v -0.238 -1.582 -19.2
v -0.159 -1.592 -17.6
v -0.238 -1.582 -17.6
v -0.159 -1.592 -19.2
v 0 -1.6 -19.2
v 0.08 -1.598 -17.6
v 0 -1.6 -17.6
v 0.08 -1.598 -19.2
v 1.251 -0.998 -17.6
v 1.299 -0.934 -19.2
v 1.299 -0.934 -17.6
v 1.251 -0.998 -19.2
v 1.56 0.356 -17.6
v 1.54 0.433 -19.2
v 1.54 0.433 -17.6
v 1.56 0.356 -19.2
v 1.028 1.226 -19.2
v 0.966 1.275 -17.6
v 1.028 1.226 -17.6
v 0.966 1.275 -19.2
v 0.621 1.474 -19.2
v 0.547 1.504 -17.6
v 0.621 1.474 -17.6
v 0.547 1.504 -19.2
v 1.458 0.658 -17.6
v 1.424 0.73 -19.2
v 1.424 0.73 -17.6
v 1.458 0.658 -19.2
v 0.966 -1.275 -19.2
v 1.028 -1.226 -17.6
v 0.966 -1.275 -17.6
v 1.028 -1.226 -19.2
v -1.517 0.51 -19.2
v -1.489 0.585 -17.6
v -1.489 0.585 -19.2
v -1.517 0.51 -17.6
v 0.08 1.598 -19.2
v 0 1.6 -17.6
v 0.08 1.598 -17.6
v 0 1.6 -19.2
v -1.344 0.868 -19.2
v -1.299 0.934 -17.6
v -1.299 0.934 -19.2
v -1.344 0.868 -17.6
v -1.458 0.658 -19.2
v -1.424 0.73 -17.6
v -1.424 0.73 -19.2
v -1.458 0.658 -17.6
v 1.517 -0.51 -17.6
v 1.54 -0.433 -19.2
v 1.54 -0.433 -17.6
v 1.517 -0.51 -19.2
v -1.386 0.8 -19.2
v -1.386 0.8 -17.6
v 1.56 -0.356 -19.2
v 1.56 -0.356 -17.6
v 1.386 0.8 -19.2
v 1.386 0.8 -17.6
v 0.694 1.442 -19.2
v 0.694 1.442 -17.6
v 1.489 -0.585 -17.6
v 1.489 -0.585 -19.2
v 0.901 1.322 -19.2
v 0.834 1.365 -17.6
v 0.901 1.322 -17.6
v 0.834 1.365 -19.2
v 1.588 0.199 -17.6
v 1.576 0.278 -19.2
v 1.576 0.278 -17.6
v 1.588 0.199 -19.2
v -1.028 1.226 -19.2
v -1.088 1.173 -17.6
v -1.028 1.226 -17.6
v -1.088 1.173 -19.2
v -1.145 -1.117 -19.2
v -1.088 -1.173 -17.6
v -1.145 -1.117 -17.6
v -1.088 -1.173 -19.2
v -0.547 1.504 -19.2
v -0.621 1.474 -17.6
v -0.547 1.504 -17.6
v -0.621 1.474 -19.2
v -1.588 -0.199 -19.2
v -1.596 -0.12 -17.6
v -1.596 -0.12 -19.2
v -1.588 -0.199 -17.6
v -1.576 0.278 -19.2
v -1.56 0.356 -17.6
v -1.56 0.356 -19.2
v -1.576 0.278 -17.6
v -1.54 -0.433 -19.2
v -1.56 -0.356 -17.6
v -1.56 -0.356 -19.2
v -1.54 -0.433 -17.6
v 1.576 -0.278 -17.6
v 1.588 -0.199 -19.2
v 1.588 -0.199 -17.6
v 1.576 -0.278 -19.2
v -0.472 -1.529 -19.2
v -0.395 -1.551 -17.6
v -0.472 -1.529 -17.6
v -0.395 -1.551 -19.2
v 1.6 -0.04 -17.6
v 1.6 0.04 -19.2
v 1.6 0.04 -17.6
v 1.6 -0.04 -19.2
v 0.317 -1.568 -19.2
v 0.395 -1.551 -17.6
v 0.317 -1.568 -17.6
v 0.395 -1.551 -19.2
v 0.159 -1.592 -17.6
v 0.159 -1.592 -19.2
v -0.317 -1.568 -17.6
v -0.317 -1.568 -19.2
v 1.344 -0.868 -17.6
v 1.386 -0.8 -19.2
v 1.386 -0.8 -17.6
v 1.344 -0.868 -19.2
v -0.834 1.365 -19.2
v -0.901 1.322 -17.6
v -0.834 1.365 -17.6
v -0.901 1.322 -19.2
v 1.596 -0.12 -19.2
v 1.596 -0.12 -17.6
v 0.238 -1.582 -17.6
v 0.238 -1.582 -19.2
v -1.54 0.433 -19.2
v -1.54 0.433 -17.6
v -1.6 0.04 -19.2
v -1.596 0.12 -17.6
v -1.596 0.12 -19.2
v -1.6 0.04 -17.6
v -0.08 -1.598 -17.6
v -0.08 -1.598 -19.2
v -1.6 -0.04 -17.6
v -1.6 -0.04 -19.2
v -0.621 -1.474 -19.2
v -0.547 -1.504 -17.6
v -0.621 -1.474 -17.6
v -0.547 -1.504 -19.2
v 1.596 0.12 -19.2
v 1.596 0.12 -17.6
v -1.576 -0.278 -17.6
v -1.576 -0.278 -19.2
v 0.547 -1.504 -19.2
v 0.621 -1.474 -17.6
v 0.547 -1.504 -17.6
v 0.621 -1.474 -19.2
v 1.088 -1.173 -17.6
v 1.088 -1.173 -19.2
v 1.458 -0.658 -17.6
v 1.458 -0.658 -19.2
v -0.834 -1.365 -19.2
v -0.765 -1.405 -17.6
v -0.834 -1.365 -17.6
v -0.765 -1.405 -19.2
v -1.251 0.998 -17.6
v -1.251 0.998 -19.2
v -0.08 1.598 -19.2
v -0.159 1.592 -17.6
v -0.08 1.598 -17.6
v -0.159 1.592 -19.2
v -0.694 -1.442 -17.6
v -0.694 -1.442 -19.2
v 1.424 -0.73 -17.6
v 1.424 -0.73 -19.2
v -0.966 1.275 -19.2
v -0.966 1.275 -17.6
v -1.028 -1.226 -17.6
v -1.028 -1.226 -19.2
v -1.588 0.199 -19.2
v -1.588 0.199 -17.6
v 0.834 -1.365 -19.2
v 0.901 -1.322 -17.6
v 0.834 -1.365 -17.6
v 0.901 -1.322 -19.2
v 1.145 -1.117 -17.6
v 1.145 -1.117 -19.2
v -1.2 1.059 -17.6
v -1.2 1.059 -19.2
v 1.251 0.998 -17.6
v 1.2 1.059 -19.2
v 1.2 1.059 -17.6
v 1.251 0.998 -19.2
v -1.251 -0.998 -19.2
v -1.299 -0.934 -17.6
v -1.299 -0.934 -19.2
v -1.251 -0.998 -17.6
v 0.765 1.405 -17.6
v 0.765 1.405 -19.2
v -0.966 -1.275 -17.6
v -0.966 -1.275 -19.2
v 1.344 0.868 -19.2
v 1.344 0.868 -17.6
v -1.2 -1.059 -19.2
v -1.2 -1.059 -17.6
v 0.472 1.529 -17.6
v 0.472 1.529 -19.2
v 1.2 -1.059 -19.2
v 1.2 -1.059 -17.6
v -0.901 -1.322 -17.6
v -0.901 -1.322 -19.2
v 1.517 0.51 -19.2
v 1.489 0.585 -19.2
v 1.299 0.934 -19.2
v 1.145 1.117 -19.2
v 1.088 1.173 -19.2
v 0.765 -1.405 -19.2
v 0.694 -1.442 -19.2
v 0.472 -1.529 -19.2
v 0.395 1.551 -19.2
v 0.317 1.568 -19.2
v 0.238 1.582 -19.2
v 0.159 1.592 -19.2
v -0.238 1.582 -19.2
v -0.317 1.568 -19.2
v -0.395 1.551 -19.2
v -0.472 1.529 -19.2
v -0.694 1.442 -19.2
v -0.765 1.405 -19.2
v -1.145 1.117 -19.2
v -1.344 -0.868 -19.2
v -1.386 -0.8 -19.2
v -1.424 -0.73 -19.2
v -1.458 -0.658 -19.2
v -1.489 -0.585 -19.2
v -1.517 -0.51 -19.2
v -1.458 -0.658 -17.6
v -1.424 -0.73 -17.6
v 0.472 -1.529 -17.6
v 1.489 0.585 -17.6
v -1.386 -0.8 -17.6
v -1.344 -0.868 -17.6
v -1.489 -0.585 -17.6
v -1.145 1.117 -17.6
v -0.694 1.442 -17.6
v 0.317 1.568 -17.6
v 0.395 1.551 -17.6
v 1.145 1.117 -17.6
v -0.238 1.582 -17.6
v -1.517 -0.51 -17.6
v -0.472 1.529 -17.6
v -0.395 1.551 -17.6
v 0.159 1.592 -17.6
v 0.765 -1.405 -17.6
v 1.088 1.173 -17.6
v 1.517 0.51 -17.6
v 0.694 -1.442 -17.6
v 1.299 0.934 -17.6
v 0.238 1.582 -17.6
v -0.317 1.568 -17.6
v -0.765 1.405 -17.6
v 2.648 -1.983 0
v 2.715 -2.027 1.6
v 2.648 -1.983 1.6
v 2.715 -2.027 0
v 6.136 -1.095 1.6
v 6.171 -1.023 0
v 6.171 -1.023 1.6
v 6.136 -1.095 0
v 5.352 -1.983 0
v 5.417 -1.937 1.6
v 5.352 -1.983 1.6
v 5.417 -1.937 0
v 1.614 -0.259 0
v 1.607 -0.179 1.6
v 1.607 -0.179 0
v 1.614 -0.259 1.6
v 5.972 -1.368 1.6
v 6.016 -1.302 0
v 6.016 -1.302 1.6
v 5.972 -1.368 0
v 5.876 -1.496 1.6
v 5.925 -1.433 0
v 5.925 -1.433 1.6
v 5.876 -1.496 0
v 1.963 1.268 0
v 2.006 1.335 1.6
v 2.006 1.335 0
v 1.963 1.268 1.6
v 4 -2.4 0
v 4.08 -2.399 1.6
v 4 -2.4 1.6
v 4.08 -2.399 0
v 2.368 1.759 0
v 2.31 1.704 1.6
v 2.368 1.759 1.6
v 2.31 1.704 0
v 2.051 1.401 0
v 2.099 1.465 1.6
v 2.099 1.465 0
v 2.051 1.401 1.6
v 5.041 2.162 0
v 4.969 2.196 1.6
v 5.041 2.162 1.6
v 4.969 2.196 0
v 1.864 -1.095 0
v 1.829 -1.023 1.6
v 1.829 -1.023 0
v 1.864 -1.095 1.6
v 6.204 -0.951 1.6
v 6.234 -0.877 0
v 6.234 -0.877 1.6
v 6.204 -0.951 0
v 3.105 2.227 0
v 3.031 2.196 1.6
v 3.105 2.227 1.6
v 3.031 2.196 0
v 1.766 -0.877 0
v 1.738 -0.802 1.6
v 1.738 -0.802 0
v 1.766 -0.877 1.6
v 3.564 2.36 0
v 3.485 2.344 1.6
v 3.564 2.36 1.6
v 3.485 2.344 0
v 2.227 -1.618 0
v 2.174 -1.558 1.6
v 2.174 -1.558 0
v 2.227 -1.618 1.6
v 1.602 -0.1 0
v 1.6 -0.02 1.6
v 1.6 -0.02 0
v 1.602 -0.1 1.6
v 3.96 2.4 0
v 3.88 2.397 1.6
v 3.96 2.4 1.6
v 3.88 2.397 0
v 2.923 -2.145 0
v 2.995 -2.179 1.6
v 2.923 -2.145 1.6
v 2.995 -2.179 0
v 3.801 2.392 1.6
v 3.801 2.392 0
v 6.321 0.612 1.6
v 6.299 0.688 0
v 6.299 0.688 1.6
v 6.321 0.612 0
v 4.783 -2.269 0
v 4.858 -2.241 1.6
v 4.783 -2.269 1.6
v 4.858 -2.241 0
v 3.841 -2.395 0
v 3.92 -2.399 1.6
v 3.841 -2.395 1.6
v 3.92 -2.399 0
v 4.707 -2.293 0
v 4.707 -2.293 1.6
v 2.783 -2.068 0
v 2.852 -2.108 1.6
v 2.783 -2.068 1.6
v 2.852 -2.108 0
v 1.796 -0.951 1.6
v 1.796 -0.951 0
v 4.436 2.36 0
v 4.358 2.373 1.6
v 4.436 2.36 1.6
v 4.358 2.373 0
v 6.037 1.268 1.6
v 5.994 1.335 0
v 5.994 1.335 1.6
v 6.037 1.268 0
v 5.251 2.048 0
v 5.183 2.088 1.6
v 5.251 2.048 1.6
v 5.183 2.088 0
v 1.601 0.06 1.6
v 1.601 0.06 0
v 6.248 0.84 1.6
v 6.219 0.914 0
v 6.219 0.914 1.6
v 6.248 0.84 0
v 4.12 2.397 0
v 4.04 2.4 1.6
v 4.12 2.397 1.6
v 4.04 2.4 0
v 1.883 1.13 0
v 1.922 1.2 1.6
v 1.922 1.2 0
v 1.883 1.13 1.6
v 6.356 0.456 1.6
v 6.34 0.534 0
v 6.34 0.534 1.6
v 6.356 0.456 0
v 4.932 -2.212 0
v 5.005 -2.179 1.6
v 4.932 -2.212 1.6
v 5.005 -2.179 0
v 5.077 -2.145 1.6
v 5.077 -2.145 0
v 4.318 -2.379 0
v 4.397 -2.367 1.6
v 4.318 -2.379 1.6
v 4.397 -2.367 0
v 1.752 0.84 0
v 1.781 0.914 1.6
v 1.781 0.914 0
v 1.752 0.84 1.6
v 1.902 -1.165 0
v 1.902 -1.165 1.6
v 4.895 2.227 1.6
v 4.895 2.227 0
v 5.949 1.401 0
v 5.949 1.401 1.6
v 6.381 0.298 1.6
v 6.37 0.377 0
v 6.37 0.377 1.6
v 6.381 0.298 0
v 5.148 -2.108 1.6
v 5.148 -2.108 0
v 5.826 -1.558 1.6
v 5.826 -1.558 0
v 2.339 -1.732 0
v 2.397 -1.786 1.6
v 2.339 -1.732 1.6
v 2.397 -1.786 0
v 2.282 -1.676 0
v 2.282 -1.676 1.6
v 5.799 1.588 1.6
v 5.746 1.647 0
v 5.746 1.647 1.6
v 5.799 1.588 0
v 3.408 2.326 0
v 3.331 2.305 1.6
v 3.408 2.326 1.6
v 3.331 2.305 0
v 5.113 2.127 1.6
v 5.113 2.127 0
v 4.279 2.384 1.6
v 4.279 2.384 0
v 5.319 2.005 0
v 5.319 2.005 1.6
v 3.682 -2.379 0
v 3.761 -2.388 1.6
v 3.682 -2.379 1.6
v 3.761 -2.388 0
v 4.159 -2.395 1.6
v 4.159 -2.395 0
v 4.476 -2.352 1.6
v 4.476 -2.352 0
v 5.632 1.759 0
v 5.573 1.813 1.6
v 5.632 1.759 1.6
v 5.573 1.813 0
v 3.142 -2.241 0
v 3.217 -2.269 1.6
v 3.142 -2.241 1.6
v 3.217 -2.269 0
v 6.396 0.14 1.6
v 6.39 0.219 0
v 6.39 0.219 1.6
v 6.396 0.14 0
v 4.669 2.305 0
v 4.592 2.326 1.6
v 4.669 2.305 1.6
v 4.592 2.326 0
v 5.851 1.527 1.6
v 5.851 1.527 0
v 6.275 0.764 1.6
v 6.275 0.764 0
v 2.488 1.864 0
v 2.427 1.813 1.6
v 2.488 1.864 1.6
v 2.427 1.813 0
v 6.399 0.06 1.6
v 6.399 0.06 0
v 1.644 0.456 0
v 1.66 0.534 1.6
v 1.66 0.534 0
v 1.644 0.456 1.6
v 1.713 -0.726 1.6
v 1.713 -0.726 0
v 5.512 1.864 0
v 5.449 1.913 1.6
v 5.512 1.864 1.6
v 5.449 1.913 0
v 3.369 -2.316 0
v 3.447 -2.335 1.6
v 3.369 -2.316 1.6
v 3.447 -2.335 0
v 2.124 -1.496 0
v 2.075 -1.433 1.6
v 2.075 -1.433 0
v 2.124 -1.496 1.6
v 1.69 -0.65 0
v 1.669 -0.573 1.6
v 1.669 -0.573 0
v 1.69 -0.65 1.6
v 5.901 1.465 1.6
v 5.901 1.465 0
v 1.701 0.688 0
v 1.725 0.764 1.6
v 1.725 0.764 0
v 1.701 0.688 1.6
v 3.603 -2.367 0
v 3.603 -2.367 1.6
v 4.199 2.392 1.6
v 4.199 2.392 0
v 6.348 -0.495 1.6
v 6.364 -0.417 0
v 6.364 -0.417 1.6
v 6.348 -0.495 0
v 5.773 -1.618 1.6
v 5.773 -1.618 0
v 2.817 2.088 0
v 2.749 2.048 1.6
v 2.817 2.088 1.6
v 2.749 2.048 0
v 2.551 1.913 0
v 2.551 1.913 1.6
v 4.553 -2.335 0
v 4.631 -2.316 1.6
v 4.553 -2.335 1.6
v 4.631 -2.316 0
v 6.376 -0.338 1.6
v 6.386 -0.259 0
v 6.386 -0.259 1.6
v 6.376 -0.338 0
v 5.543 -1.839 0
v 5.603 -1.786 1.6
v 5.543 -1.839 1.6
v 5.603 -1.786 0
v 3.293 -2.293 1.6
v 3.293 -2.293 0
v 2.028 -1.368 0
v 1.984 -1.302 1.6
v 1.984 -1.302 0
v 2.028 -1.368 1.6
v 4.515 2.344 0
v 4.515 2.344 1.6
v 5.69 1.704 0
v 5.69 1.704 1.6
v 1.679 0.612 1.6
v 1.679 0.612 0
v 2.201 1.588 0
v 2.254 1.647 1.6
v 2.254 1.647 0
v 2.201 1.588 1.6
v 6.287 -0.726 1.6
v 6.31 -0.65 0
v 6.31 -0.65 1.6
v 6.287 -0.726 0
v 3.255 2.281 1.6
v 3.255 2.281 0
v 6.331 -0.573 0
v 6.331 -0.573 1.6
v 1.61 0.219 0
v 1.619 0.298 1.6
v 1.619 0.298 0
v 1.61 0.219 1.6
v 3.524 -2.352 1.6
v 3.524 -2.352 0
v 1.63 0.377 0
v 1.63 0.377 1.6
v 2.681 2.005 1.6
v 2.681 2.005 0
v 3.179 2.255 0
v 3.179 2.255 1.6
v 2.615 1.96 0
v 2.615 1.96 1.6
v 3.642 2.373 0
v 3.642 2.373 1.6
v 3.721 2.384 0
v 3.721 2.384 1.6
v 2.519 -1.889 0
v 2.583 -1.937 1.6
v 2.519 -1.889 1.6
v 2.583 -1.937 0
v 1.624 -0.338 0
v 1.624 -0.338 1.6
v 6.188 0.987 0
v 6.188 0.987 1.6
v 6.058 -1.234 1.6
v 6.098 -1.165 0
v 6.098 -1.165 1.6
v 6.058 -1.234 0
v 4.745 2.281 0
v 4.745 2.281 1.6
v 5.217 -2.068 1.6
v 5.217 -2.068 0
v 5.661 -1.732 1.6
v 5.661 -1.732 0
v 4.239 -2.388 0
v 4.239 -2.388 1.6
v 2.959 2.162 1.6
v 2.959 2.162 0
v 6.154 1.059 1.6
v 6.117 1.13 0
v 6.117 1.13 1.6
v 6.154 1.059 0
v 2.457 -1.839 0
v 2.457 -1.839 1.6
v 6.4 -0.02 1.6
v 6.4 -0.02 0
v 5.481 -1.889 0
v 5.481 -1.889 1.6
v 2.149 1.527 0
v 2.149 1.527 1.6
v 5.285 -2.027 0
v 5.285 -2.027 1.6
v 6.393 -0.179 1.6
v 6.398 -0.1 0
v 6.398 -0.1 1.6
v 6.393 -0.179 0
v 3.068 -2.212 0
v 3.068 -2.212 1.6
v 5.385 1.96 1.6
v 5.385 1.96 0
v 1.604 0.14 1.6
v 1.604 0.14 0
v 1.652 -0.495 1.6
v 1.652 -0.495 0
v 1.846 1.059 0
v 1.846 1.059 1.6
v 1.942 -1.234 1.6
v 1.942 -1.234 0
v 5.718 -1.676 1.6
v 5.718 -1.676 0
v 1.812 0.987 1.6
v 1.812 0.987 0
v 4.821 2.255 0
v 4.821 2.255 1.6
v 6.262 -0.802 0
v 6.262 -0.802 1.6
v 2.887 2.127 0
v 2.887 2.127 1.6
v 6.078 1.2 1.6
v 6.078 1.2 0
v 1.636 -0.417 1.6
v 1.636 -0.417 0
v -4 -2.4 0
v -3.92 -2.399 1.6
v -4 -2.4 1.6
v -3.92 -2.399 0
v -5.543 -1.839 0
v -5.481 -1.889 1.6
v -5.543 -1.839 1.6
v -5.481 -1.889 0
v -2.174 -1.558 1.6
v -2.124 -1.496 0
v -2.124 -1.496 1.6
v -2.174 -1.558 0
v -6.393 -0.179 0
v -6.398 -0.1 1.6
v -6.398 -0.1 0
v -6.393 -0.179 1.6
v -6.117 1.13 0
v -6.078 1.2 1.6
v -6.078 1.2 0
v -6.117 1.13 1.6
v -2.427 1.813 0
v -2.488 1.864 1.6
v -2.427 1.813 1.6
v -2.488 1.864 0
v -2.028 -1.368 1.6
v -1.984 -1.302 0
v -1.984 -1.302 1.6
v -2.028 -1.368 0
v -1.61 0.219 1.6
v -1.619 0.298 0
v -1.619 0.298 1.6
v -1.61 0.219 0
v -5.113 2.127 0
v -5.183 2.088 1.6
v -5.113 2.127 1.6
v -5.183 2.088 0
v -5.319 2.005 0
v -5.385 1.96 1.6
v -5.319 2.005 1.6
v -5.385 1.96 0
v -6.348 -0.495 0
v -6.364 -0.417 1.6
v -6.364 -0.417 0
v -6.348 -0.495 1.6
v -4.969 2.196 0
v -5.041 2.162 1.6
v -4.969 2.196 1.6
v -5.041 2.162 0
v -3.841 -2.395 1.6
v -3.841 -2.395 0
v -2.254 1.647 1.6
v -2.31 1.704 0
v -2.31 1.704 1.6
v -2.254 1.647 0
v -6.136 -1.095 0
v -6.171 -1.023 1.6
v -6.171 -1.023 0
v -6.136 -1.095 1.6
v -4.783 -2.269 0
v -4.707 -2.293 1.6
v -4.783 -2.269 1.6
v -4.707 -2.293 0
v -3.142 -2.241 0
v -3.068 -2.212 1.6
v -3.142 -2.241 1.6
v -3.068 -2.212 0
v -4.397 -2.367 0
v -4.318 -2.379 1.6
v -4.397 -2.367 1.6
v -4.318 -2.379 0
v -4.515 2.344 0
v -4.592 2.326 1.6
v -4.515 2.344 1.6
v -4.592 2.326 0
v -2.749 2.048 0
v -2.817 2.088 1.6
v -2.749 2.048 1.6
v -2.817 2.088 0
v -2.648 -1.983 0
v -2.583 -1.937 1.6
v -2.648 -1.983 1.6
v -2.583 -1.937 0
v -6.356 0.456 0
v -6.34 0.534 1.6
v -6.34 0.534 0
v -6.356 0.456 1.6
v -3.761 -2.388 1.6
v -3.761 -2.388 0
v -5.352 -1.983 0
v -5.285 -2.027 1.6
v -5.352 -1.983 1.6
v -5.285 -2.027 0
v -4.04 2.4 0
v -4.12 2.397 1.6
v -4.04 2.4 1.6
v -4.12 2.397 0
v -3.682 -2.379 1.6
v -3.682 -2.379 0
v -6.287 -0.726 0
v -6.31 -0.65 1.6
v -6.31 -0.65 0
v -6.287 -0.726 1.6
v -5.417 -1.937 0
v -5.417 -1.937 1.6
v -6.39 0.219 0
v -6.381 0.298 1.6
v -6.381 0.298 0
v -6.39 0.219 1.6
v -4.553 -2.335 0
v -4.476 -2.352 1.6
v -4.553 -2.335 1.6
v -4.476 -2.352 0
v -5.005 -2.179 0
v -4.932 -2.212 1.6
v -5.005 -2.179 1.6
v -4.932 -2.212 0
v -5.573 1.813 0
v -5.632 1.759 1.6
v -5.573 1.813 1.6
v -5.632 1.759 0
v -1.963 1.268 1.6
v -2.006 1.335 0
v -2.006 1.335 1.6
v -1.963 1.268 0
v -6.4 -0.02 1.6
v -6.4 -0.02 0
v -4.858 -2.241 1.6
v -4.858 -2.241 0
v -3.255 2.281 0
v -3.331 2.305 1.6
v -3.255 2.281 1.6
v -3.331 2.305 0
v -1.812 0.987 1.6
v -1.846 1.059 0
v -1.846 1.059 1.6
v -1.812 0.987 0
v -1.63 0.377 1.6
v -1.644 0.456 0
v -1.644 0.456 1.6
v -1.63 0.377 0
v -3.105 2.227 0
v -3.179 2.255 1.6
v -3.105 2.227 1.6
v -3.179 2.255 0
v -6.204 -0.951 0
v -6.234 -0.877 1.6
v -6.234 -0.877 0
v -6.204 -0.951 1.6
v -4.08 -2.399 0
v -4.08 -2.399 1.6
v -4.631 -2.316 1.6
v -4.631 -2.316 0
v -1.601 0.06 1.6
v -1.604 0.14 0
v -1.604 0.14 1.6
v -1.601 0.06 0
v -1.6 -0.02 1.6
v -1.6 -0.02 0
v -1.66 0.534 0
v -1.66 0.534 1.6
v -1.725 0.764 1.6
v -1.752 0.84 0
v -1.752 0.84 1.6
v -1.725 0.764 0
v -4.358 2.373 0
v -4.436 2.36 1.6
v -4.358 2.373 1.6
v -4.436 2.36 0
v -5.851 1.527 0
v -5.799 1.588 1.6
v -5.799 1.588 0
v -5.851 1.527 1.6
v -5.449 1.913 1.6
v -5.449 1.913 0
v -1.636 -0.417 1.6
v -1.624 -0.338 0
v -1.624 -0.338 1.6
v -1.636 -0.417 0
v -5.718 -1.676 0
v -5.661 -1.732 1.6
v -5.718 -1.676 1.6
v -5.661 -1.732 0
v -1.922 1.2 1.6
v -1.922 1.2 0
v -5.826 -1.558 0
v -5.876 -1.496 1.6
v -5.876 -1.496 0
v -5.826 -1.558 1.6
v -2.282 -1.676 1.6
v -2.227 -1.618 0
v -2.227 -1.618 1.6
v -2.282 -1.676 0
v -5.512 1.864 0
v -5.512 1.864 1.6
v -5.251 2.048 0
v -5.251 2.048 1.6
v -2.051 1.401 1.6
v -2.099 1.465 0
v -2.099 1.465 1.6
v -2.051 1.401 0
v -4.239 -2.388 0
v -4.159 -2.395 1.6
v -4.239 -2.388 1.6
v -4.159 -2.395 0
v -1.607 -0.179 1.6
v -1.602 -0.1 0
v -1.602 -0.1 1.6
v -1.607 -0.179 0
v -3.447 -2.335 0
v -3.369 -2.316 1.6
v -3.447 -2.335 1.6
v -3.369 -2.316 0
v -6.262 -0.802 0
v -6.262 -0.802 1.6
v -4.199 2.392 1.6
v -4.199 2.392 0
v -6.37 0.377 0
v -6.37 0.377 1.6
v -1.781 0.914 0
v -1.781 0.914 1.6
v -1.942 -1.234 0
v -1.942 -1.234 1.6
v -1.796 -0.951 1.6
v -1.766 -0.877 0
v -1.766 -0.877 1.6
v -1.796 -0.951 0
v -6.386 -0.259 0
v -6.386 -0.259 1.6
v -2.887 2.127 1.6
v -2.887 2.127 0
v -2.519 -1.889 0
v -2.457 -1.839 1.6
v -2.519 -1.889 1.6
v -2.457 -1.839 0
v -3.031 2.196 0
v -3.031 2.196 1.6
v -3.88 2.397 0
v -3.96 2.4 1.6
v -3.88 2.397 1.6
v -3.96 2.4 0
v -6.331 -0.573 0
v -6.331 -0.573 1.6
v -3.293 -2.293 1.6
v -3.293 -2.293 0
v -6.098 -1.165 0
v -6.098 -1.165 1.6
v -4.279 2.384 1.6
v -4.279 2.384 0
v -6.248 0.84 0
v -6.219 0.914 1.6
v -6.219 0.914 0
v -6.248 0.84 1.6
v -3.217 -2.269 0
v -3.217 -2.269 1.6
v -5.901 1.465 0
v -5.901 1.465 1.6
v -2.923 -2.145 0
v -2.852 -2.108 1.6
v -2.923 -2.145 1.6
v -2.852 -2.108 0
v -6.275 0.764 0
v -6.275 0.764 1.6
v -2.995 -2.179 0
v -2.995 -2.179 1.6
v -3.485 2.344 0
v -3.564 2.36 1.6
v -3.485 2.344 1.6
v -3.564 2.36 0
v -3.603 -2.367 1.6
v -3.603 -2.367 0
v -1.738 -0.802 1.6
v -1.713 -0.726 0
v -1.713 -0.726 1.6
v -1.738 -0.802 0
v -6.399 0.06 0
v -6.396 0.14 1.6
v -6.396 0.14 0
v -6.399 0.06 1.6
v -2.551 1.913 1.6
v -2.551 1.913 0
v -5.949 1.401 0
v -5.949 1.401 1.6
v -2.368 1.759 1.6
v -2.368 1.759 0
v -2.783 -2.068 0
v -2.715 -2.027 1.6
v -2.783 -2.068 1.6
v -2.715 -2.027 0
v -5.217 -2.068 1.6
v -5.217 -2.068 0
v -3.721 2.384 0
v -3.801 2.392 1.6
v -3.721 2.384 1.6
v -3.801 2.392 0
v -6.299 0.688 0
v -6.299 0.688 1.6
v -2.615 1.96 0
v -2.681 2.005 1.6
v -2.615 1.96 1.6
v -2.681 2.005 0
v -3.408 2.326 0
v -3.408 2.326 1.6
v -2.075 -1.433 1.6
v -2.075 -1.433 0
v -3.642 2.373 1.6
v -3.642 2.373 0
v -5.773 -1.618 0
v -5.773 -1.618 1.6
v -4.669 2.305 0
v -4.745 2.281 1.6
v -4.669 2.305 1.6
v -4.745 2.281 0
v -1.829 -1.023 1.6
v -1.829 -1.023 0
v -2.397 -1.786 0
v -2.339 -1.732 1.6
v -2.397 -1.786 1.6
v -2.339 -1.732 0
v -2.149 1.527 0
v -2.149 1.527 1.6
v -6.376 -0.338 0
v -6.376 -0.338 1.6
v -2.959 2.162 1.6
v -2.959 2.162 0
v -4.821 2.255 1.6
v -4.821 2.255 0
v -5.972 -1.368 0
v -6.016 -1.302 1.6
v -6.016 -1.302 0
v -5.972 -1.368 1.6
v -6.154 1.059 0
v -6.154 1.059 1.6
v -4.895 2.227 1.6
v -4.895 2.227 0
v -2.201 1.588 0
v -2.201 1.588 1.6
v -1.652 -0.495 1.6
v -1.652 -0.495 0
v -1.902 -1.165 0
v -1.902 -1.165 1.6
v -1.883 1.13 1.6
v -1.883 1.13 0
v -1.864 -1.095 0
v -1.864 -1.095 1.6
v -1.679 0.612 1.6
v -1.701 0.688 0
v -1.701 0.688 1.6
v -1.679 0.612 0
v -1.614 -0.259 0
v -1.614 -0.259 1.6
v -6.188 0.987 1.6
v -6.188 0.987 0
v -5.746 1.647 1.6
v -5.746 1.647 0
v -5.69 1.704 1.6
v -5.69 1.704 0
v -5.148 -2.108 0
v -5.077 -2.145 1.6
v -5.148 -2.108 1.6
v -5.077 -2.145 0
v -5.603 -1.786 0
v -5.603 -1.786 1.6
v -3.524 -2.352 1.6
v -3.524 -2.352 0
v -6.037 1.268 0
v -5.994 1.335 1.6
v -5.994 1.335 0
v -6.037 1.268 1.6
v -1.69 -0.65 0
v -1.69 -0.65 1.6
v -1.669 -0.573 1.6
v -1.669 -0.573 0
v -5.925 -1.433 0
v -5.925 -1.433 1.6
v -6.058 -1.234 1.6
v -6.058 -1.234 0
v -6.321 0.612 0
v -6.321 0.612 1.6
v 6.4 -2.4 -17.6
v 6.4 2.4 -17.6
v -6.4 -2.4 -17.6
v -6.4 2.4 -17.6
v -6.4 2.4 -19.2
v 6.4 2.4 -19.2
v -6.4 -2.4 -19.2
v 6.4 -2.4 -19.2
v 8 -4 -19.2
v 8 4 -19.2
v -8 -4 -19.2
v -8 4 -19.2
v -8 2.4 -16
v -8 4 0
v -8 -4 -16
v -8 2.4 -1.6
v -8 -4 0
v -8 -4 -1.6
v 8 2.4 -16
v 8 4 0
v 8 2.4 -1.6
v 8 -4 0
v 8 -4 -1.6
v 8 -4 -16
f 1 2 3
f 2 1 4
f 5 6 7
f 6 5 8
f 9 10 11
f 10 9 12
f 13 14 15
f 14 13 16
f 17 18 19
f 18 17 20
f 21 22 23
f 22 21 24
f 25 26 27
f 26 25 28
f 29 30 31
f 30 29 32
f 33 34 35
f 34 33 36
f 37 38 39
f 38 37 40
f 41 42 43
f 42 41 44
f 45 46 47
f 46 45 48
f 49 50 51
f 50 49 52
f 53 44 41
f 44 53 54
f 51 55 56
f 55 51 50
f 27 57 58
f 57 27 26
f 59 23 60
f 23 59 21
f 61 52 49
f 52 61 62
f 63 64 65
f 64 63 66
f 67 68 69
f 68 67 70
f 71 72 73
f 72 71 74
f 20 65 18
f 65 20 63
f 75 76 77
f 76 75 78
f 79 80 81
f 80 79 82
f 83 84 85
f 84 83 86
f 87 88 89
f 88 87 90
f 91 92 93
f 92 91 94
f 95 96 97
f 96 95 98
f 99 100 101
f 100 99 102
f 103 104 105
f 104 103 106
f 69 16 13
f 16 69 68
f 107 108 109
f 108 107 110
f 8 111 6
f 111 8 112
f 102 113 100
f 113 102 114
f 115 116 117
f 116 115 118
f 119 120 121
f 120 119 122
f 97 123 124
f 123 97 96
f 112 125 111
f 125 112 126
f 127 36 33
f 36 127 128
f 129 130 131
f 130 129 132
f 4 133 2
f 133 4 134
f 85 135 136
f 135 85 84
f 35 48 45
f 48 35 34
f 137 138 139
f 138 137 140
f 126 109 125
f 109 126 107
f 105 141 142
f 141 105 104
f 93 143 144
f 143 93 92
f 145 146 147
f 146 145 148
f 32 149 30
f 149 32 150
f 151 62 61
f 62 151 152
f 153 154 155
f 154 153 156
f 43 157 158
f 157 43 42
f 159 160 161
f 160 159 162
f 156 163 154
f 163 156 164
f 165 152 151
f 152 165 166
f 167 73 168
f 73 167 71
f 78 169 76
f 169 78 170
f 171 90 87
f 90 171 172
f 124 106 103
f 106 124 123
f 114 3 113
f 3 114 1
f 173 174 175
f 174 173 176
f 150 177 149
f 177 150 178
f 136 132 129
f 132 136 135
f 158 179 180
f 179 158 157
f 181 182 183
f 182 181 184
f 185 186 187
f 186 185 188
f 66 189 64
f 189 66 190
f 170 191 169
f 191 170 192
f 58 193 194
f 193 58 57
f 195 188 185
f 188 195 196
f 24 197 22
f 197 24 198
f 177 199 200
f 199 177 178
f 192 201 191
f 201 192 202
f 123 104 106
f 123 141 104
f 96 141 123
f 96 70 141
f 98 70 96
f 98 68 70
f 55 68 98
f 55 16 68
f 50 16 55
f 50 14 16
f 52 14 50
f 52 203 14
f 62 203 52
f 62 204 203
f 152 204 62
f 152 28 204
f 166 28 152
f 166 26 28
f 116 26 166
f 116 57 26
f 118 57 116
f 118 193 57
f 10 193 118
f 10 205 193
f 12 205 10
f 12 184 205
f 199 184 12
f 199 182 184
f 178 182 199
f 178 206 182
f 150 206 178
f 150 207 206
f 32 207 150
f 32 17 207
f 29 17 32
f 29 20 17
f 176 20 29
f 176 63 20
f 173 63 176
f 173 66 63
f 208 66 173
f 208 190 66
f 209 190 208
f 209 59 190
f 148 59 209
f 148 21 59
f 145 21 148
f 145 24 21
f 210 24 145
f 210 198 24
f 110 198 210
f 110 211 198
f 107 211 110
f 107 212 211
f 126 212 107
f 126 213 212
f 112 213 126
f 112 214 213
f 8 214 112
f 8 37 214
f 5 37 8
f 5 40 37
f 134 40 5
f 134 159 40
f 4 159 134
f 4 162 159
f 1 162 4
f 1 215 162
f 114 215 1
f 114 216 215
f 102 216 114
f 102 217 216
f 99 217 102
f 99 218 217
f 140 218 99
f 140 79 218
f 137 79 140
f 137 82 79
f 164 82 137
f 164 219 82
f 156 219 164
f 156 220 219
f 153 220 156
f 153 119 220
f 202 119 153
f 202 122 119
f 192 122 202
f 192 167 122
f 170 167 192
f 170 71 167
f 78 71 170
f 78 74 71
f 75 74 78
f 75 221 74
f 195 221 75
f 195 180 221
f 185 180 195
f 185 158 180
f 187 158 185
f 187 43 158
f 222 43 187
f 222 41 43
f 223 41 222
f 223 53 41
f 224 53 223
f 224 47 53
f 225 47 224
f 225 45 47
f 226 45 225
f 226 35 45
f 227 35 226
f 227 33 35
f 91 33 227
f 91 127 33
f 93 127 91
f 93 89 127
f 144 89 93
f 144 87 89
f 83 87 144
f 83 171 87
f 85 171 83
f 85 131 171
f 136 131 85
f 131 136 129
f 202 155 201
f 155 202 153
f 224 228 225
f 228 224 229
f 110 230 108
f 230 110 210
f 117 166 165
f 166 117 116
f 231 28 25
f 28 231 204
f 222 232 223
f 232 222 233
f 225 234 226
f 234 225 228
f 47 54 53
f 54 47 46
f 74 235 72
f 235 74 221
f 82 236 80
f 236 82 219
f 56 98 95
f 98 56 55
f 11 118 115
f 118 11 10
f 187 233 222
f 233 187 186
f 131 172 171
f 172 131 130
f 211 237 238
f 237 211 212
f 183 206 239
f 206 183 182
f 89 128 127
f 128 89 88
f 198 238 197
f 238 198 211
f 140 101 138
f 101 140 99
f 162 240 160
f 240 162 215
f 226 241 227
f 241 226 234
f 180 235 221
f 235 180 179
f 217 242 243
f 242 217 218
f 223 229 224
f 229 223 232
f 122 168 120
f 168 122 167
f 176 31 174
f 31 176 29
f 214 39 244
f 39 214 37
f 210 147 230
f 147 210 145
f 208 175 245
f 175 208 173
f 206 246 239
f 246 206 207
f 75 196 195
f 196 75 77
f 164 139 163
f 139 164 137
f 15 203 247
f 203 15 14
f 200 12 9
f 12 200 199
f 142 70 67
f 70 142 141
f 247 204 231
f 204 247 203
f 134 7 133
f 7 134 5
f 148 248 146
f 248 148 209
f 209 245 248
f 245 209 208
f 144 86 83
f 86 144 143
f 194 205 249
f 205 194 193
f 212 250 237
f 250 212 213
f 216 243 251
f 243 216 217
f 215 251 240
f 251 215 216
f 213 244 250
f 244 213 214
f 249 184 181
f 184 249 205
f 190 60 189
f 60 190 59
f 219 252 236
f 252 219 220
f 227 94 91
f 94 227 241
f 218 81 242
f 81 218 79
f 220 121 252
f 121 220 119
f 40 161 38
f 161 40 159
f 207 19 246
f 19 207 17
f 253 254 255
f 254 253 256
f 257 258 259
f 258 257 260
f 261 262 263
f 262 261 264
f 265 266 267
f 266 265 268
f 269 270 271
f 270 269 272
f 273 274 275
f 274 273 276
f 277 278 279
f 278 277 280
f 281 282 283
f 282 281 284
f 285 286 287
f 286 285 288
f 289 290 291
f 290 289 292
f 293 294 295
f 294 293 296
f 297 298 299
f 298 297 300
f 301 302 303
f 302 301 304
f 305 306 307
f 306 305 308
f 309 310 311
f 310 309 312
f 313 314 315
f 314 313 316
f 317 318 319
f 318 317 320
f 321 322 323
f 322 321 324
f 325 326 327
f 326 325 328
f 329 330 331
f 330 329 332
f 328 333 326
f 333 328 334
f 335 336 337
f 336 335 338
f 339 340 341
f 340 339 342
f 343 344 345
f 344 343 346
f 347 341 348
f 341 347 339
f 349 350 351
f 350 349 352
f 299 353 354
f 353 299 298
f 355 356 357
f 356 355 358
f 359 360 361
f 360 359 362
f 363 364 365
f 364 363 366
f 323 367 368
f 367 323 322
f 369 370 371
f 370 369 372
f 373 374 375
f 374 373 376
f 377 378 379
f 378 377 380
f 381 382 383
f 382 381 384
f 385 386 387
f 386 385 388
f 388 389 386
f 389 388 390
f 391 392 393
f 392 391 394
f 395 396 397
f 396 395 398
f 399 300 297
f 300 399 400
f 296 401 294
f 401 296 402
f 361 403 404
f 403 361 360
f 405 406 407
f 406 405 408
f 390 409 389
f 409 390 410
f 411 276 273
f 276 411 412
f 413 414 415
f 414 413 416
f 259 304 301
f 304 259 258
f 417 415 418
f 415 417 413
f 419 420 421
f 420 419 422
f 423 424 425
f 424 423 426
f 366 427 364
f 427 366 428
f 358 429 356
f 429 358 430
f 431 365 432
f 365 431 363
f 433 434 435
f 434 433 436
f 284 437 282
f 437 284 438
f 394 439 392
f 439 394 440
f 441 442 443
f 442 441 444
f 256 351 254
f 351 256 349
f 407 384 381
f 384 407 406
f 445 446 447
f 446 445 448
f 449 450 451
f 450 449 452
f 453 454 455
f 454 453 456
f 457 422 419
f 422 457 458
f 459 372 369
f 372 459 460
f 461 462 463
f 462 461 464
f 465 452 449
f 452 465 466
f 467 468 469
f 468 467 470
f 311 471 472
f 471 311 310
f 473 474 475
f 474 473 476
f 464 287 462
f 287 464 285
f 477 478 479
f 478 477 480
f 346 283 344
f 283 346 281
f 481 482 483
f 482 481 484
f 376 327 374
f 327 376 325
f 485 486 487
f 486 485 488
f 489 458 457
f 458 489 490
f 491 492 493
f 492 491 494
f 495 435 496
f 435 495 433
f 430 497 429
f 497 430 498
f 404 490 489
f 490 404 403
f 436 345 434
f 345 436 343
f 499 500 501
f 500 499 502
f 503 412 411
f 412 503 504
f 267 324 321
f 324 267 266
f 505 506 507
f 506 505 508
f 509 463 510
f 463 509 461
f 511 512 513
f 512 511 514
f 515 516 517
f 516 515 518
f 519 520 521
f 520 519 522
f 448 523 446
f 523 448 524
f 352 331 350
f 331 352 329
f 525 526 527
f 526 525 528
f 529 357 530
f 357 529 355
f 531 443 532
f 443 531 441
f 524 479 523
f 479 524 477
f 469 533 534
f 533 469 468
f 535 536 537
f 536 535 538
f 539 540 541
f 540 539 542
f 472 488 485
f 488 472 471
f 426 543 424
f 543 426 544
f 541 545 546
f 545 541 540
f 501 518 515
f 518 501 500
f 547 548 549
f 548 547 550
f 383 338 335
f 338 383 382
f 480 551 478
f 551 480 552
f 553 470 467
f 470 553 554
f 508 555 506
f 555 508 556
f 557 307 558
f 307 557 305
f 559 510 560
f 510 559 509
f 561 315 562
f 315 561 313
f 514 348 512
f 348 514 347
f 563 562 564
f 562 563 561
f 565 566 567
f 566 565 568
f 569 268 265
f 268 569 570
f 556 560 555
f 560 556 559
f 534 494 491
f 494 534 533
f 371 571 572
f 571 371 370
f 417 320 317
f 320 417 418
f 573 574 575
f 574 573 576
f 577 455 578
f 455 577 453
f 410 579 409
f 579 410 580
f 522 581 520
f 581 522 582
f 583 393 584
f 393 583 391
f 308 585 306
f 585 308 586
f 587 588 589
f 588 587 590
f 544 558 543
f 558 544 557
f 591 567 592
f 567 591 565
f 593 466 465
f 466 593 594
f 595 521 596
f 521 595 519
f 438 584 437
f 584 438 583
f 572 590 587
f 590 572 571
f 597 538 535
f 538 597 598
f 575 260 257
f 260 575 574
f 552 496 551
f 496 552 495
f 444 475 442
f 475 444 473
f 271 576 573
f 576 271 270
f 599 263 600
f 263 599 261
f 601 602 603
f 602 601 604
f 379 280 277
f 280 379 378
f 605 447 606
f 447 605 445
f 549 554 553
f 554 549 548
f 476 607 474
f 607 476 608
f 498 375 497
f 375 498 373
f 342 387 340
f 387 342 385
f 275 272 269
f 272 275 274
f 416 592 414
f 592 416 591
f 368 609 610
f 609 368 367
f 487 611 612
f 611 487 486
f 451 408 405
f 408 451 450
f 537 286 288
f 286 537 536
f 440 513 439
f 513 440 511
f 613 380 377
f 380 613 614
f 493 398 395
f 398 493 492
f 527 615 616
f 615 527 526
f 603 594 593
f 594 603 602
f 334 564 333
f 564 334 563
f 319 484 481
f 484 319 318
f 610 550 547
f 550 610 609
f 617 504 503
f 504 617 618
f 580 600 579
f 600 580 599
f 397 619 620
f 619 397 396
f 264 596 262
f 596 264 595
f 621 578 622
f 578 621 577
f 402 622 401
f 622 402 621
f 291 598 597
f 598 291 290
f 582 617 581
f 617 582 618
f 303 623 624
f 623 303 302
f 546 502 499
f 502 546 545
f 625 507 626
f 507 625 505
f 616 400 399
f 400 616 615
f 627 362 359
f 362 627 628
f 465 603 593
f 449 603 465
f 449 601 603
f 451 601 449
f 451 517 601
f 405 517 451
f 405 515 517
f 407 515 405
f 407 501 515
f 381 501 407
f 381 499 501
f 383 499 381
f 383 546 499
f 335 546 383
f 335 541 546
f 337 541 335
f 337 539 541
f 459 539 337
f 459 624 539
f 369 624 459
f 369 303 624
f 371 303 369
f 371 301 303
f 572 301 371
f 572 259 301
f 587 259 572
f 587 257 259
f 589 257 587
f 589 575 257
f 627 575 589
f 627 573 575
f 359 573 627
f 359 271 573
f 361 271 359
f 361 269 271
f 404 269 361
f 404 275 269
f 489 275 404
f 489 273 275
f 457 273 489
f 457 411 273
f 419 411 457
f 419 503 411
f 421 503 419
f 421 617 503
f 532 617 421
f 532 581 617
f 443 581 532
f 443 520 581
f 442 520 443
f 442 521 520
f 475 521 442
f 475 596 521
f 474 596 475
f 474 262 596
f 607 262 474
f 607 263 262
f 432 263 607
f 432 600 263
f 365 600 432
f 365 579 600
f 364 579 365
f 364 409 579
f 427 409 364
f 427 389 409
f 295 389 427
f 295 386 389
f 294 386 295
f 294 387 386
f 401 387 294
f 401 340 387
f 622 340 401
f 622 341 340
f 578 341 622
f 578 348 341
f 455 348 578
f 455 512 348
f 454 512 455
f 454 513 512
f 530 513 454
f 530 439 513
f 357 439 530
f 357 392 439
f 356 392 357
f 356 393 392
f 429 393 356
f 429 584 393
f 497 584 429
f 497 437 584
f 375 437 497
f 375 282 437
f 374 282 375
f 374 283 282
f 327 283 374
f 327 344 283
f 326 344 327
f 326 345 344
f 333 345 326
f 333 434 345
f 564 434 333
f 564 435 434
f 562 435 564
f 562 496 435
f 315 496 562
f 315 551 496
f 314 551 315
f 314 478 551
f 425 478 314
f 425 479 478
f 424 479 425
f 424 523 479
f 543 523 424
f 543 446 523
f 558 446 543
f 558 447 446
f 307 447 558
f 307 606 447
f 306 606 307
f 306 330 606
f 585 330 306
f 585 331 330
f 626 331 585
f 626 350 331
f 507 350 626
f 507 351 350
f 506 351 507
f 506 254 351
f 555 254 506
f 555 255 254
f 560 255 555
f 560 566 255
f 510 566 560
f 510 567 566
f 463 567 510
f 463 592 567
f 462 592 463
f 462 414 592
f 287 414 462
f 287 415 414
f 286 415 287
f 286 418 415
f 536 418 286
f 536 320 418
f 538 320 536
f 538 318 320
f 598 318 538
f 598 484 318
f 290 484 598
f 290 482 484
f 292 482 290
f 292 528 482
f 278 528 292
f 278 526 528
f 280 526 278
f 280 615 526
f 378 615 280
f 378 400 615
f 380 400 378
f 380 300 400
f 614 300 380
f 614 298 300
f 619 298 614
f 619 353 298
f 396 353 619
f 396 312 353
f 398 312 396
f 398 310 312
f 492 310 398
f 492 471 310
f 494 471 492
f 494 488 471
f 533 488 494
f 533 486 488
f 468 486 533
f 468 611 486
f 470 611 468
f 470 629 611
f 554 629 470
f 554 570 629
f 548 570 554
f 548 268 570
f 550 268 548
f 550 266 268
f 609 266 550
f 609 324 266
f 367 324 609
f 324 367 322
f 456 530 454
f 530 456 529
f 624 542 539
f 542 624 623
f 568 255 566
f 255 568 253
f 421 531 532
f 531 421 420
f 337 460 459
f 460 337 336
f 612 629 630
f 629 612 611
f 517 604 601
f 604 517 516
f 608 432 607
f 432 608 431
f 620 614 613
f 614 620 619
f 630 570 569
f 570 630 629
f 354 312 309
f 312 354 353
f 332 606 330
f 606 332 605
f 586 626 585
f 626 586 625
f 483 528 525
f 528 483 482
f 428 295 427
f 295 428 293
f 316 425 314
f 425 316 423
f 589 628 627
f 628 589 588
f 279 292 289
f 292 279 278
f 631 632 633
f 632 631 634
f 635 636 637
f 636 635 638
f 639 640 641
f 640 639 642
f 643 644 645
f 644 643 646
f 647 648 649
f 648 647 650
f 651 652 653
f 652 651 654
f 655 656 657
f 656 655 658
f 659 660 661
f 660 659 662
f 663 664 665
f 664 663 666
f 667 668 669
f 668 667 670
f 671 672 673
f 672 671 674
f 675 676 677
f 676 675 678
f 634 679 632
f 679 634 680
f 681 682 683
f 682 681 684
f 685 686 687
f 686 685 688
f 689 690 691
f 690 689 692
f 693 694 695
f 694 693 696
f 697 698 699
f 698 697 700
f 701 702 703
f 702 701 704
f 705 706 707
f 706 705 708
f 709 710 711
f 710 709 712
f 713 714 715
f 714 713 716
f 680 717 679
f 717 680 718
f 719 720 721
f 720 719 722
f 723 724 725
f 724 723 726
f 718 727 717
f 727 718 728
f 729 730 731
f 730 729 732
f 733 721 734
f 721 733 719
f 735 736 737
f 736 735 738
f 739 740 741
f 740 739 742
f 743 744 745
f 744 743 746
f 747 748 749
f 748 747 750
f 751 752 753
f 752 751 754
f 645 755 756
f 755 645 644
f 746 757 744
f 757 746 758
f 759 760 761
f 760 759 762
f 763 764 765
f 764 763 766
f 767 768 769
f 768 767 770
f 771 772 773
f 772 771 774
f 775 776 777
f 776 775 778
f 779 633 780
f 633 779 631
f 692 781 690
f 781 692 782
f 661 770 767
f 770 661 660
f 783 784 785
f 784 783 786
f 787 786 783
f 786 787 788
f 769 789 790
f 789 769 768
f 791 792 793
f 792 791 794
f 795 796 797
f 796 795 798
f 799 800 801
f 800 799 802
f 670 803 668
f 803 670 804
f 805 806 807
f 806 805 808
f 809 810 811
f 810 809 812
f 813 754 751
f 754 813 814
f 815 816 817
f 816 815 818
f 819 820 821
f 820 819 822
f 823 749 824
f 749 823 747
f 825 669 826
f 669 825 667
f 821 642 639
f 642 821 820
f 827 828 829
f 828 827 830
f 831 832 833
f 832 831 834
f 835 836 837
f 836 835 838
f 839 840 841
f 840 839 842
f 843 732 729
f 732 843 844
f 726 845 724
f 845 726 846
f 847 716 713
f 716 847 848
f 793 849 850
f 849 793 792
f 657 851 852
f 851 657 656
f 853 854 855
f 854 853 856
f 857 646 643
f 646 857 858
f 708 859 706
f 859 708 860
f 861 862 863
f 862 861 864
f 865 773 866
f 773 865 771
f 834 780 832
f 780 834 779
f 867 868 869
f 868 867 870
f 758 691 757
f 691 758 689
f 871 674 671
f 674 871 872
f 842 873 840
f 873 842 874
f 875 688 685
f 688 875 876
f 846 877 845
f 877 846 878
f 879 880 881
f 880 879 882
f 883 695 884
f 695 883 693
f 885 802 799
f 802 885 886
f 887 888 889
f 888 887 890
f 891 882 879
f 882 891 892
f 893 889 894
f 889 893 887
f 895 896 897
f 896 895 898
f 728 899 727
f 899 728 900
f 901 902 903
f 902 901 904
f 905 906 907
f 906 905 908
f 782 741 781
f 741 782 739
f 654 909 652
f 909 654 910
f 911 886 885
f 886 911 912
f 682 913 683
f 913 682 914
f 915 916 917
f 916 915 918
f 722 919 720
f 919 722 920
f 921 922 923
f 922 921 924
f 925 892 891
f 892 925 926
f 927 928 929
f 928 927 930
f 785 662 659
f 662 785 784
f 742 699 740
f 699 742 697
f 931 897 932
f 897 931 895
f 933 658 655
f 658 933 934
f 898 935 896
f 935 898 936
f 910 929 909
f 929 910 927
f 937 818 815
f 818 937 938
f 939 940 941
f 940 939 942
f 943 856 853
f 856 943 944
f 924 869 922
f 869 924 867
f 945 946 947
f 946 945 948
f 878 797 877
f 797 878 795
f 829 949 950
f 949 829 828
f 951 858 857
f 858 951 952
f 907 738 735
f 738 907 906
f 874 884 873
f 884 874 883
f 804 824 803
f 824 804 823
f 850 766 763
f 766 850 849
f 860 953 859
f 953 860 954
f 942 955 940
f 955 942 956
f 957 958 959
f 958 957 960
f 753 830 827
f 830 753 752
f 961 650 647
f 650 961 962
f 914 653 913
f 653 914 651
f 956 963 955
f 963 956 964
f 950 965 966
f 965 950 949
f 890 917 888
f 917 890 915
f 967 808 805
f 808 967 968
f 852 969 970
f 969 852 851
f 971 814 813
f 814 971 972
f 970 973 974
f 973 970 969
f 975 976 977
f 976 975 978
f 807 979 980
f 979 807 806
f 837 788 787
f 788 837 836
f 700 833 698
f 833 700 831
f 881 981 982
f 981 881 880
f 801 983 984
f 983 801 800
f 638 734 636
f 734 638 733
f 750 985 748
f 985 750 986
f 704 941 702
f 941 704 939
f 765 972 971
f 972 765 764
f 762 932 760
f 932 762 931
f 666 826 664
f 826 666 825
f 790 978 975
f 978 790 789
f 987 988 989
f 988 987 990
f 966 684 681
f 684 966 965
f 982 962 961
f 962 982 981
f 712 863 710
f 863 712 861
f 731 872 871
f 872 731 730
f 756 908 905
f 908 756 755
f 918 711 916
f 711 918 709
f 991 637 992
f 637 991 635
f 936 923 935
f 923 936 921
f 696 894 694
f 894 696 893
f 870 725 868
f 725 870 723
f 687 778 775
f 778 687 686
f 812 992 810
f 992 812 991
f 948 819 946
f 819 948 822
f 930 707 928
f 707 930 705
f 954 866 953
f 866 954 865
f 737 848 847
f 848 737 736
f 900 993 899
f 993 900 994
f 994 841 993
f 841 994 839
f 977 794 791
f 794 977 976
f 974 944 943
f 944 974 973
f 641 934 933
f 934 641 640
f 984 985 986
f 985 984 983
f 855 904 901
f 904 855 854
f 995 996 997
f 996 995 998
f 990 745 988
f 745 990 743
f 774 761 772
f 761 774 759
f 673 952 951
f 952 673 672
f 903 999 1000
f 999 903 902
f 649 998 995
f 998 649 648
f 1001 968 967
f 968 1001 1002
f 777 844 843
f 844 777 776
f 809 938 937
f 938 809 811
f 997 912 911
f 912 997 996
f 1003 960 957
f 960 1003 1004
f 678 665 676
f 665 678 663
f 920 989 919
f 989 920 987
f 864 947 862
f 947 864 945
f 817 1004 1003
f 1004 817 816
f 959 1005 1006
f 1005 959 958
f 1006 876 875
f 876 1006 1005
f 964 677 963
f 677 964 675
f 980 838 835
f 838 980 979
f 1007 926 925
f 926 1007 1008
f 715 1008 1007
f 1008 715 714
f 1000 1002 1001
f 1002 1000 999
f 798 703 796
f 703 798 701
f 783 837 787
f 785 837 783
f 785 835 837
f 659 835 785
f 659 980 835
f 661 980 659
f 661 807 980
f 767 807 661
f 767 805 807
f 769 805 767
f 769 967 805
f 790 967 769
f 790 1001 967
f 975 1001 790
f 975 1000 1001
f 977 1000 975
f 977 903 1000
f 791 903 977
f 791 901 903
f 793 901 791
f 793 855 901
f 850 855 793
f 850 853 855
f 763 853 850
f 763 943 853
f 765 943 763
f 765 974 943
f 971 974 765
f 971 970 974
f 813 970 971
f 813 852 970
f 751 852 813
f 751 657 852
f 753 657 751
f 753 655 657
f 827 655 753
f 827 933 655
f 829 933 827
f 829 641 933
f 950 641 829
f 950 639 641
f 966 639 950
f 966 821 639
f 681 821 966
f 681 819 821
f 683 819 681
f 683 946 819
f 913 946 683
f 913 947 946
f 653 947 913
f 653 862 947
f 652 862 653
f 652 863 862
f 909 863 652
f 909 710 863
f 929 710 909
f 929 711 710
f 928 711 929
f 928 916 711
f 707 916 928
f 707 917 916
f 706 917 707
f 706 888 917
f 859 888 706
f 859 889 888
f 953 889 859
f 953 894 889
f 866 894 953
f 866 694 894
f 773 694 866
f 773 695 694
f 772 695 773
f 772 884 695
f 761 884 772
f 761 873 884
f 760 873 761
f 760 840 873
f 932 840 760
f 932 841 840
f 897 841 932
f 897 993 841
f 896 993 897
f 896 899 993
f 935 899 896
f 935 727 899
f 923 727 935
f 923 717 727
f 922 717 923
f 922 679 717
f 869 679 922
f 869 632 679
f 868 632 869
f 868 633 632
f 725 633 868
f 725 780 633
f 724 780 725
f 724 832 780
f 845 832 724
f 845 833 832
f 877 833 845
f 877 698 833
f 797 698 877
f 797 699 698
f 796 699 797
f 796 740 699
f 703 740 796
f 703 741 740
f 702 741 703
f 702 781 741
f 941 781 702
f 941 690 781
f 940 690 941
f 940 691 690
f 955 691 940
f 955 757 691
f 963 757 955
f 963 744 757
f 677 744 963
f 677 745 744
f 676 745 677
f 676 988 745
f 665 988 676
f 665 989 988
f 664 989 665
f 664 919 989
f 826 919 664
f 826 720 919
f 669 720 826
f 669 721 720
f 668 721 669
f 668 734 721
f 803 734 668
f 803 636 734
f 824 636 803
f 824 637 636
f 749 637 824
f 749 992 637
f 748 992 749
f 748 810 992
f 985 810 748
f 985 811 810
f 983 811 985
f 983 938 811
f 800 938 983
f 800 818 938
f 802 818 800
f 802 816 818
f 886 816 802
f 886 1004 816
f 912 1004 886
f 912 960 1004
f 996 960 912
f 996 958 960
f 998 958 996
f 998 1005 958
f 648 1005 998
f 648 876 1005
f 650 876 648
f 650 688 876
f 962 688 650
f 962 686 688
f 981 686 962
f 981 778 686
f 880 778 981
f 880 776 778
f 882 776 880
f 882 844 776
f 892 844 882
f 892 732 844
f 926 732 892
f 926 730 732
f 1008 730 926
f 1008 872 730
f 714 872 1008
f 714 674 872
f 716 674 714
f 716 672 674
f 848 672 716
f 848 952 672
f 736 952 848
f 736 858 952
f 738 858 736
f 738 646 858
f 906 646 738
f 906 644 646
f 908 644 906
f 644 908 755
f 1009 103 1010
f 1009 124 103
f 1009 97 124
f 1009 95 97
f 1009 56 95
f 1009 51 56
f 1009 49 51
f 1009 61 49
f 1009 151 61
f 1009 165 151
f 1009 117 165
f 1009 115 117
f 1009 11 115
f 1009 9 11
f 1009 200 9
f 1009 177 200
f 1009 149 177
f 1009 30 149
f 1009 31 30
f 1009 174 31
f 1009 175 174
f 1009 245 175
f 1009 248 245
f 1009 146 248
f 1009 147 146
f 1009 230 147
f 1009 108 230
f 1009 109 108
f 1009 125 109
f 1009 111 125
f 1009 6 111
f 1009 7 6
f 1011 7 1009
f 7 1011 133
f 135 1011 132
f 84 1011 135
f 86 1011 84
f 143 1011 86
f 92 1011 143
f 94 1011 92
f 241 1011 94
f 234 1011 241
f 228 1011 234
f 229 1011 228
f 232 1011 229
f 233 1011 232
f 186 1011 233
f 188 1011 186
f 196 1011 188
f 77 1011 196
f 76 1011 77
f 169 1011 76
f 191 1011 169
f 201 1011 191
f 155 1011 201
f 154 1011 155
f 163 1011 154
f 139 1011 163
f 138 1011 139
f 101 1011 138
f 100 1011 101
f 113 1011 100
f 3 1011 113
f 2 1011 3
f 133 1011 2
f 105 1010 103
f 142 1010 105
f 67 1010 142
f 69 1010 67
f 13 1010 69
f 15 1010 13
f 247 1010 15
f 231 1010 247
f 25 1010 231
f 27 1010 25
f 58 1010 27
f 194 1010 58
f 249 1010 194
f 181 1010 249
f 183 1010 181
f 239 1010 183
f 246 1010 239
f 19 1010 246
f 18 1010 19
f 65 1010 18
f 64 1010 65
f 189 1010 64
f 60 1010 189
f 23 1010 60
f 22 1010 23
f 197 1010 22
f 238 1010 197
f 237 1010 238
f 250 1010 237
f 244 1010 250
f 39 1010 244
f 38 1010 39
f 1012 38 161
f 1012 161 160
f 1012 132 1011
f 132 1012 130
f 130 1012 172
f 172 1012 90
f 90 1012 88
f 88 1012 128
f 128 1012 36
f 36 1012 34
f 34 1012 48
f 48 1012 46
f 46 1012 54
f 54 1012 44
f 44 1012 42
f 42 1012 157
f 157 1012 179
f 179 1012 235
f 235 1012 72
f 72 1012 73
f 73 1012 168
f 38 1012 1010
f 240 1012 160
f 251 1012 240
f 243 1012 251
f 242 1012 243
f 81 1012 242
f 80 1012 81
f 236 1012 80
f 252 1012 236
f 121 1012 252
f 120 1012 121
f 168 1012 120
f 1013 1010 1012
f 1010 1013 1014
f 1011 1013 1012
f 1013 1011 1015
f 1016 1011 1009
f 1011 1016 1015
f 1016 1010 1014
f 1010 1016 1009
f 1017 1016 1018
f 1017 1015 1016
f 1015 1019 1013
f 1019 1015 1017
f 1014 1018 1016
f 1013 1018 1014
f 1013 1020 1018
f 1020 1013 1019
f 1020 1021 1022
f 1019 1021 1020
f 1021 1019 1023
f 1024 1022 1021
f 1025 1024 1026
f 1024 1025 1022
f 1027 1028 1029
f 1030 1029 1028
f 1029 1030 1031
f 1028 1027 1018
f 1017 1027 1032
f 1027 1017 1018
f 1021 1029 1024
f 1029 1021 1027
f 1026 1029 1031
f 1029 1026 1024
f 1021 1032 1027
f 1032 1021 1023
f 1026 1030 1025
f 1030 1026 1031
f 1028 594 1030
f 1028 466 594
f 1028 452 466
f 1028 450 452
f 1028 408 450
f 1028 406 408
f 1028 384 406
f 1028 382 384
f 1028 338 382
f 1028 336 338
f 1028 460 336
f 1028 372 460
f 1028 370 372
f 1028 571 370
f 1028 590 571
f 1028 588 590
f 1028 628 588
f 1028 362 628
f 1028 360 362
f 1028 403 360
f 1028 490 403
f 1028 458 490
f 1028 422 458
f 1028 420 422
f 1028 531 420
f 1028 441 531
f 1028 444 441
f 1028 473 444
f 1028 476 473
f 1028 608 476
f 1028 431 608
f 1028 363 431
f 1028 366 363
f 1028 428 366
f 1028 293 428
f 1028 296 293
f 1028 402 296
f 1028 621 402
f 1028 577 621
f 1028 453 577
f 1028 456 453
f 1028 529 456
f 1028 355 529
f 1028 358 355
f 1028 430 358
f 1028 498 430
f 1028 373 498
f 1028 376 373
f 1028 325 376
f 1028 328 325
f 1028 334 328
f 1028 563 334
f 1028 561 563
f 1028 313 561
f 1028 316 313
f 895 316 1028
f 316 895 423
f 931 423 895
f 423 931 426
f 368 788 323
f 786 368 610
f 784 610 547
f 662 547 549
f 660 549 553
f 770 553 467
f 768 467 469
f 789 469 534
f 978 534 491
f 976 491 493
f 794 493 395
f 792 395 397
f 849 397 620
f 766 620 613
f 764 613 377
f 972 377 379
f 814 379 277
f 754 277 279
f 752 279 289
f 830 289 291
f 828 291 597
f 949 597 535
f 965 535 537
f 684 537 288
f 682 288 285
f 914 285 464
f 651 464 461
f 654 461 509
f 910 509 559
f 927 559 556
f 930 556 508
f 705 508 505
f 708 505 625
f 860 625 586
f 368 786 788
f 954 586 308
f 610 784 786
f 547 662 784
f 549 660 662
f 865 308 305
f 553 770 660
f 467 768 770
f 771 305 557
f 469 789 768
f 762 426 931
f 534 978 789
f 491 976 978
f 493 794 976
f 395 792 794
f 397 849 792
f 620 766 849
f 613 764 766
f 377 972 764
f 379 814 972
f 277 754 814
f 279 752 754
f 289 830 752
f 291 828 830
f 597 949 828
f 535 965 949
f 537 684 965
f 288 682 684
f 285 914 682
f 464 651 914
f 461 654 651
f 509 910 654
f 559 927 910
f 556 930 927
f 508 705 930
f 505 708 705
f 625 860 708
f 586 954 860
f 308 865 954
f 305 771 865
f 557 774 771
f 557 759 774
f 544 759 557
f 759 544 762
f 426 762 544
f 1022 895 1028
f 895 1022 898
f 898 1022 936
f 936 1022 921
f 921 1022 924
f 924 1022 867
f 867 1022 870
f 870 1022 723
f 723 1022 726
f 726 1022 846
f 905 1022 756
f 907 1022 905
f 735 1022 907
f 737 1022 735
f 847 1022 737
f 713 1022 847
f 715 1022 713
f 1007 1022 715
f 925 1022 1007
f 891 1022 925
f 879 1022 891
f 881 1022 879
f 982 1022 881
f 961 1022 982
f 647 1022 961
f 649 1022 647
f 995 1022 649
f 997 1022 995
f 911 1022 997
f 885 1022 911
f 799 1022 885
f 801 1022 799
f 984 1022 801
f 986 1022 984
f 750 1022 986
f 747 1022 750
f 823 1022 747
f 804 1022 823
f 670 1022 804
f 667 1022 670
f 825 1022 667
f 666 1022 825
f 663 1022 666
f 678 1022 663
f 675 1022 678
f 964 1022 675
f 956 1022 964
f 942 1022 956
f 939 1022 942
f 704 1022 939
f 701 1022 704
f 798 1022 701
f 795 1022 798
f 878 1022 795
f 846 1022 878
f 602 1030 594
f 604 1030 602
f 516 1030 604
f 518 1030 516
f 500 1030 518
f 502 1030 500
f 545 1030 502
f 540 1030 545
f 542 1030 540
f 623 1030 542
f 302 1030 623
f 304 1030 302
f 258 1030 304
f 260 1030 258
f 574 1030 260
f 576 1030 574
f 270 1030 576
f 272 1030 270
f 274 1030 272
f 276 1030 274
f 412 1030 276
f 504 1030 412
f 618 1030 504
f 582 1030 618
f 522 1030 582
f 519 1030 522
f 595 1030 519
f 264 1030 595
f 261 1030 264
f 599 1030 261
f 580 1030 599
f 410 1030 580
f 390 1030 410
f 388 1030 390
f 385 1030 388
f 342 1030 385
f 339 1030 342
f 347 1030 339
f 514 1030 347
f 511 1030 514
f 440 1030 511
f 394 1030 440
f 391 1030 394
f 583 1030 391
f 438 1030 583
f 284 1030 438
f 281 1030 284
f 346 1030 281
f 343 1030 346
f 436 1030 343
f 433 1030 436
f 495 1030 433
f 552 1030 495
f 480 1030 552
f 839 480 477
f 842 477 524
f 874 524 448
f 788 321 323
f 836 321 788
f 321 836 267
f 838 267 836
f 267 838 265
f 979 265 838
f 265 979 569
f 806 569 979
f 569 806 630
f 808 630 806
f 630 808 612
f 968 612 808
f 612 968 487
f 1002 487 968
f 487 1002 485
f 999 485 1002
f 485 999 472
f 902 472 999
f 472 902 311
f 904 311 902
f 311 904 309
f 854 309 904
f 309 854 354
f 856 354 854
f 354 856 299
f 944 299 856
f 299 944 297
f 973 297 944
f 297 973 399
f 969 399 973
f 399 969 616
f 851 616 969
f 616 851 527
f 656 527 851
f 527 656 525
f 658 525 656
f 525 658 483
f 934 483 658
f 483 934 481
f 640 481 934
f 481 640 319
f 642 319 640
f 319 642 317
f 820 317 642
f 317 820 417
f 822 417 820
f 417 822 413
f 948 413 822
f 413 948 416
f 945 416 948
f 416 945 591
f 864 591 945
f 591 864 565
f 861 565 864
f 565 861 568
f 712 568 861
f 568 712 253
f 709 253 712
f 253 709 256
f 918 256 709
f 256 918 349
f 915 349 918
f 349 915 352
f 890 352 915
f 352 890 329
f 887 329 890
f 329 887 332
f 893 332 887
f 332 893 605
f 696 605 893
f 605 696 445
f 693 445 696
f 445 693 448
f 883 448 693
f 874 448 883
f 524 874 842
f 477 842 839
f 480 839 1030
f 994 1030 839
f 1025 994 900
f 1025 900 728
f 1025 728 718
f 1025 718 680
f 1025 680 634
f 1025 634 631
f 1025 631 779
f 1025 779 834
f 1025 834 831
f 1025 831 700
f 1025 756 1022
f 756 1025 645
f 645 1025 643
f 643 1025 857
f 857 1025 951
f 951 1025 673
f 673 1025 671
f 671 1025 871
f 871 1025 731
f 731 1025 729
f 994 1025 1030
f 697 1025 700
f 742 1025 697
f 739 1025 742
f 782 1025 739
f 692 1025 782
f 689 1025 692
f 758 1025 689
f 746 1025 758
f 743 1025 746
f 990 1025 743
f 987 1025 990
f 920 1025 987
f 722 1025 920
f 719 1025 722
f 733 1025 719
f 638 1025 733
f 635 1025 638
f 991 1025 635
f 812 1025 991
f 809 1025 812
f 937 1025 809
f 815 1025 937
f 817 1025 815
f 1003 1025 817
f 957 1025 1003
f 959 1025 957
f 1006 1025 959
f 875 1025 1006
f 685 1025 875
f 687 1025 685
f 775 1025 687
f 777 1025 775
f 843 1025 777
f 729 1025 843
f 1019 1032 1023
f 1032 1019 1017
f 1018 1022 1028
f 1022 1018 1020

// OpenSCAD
use <../lib.scad>
use <4864a.scad>
$fa=1; $fs=0.2;
function ldraw_lib__6268a(realsolid=false) = [
// 0 =Panel  1 x  2 x  2 with Solid Studs
// 0 Name: 6268a.dat
// 0 Author: Chris Dee [cwdee]
// 0 !LDRAW_ORG Part Alias UPDATE 2013-02
// 0 !LICENSE Licensed under CC BY 2.0 and CC BY 4.0 : see CAreadme.txt
// 
// 0 !HELP Part 6268a is the counterpart of 4864a. Visually, the two parts seem
// 0 !HELP identical. This file is provided to make it easier to locate part files
// 0 !HELP when using the numbers from other sources.
// 0 !HELP 4864a is used for molding opaque parts, 6268a for transparent parts.
// 
// 0 BFC CERTIFY CCW
  [0,"BFC","CERTIFY"],
  [0,"BFC","CCW"],
// 
// 0 !HISTORY 2009-05-02 [PTadmin] Official Update 2009-01
// 0 !HISTORY 2013-12-14 [cwdee] Add = prefix
// 0 !HISTORY 2013-12-23 [PTadmin] Official Update 2013-02
// 
// 
// 1 16 0 0 0 1 0 0 0 1 0 0 0 1 4864a.dat
  [1,16,0,0,0,1,0,0,0,1,0,0,0,1, ldraw_lib__4864a(realsolid)],
// 0
];
module ldraw_lib__6268a(step=0, col=false, unit=2/5, alt=false, line=0.2, solid=!$preview)
    makepoly(ldraw_lib__6268a(solid), step=step, col=col, unit=unit, alt=alt, line=line, solid=solid);
ldraw_lib__6268a(line=0.2);
